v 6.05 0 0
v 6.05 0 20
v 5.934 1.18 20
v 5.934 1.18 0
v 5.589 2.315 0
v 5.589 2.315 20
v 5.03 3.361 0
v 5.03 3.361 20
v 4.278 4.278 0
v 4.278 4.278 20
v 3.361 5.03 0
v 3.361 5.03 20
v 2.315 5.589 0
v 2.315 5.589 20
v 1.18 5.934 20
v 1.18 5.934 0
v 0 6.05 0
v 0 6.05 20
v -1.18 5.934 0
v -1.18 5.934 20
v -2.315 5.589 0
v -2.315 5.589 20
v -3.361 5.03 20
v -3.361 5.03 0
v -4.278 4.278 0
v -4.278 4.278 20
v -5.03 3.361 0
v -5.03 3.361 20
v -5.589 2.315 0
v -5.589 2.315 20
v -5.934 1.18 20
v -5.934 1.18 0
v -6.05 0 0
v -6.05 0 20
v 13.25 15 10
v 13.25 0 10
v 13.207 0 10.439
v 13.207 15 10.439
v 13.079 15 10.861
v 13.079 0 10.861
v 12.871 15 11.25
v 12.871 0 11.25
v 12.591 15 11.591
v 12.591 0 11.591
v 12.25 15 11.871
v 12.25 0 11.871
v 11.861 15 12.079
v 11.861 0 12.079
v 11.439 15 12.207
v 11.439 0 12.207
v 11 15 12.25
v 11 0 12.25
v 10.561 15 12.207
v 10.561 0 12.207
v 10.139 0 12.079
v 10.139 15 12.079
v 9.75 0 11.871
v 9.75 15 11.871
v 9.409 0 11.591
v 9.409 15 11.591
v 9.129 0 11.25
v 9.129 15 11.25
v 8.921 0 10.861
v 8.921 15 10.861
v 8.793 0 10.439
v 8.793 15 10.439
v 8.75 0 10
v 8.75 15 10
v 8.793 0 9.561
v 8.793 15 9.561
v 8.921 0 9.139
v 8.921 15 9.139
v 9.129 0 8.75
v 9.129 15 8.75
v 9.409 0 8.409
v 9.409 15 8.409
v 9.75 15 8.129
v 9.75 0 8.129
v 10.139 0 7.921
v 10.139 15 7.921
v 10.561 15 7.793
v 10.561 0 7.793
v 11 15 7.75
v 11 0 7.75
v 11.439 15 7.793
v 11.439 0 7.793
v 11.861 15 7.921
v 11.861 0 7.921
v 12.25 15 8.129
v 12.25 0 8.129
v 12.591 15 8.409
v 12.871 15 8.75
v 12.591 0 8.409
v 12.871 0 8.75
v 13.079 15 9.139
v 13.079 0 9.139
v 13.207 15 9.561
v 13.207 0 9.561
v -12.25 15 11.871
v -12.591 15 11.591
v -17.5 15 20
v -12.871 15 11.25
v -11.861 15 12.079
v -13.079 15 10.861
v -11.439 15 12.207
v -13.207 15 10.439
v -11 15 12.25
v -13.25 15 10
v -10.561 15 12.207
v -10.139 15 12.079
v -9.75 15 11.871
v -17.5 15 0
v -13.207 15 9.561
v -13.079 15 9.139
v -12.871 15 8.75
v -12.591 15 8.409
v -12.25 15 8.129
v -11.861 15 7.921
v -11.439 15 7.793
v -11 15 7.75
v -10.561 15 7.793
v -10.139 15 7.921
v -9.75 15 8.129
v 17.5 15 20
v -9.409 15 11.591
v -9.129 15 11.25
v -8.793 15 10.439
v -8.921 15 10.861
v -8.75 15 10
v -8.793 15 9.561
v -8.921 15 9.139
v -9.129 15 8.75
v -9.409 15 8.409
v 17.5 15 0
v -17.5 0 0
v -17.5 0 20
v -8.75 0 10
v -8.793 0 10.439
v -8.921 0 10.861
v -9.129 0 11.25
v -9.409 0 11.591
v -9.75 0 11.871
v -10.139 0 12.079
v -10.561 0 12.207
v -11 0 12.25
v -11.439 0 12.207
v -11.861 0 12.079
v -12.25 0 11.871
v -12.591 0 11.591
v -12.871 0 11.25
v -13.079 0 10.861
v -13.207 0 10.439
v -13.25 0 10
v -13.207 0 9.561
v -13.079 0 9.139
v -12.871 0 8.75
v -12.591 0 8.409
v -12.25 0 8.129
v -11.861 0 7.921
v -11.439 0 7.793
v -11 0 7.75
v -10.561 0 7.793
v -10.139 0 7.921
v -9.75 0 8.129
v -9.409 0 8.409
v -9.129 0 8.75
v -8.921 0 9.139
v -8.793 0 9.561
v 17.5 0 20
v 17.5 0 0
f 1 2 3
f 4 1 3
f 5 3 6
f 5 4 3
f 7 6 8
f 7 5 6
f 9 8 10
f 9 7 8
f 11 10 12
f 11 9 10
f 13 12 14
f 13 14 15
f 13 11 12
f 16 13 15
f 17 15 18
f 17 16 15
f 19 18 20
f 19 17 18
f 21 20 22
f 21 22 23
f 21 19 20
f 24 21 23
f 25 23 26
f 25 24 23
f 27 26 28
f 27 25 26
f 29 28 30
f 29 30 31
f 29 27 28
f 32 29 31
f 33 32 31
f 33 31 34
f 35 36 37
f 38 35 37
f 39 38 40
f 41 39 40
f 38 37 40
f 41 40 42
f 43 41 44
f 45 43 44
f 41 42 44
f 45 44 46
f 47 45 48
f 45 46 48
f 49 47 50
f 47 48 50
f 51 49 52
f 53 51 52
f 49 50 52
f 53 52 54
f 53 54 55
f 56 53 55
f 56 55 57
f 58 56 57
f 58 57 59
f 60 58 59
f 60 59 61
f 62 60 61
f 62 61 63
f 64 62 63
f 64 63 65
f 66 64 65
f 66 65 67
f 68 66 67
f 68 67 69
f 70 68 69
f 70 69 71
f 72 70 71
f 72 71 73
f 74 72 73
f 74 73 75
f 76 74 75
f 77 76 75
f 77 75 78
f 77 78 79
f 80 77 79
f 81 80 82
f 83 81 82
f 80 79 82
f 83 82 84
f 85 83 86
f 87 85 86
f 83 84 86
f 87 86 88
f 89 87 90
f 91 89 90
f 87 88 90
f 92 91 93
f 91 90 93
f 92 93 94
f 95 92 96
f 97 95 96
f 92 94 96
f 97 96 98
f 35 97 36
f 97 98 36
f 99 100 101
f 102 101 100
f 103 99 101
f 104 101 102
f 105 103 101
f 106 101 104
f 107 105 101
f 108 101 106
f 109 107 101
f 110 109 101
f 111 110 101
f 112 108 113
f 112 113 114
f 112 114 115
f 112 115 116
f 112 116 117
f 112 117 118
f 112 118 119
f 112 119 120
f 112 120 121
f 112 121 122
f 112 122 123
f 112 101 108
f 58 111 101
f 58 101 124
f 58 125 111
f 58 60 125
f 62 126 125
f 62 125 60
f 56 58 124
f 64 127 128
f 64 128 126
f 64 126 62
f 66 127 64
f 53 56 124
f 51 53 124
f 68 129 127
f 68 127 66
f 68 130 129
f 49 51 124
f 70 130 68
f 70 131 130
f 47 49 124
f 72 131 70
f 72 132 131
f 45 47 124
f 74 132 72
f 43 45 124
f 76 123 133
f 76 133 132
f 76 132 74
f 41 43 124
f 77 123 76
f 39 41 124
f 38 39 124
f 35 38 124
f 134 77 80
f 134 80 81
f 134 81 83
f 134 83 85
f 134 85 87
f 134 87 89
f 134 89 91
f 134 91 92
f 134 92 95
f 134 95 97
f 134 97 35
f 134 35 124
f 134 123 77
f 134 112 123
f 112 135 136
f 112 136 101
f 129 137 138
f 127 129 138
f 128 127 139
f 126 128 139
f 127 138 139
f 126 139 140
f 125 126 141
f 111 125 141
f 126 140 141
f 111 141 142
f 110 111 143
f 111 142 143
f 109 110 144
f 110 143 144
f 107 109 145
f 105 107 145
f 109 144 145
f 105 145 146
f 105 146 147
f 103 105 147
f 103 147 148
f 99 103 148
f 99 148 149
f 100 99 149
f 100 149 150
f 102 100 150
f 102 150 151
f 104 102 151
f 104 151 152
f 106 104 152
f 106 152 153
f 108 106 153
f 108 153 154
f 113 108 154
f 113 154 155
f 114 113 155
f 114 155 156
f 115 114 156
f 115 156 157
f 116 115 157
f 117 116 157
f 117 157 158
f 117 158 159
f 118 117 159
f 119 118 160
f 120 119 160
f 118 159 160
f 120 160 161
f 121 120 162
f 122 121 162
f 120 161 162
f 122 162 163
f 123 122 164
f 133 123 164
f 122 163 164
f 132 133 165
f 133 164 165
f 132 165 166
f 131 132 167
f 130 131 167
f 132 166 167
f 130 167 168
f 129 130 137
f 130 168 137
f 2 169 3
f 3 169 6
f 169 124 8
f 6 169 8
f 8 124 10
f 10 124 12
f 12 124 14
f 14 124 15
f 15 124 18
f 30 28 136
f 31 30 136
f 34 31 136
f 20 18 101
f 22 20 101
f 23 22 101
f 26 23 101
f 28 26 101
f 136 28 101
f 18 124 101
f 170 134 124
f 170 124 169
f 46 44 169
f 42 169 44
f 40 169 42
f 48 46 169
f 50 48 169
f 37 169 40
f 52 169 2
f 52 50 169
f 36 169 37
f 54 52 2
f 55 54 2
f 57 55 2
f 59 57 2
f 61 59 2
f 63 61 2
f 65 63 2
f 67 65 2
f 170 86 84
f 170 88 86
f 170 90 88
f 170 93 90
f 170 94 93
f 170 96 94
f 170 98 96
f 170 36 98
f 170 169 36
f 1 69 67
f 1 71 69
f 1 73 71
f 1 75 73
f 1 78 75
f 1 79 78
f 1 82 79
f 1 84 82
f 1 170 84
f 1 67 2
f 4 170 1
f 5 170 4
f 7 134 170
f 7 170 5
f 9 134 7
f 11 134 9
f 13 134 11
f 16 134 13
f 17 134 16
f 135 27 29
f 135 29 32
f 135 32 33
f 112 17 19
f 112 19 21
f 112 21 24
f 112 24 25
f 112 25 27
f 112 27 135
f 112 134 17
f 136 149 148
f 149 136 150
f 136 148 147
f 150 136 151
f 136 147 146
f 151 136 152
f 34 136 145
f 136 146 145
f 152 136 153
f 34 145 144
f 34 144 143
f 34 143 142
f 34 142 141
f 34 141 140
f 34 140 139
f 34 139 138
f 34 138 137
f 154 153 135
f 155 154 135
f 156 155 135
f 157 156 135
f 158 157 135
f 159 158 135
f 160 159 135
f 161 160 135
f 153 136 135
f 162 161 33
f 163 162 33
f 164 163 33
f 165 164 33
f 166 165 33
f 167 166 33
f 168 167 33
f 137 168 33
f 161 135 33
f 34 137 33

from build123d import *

# Parameters (mm, degrees)
PAD_DEPTH    = 20
SKETCH001_R  = 2.25
POCKET_DEPTH = 15.001


with BuildPart() as part:
    # Sketch → Pad (new body)
    with BuildSketch(Plane.XY):
        with BuildLine():
            Line((-17.5, 15), (17.5, 15))
            Line((17.5, 15), (17.5, 0))
            Line((17.5, 0), (6.05, 0))
            ThreePointArc((6.05, 0), (0, 6.05), (-6.05, 0))
            Line((-17.5, 0), (-6.05, 0))
            Line((-17.5, 0), (-17.5, 15))
        make_face()
    extrude(amount=PAD_DEPTH)

    # Sketch001 → Pocket (cut, through all)
    with BuildSketch(Plane.XZ):
        with Locations((-11, 10)):
            Circle(SKETCH001_R)
        with Locations((11, 10)):
            Circle(SKETCH001_R)
    extrude(amount=-POCKET_DEPTH, mode=Mode.SUBTRACT)


solid = part.part
